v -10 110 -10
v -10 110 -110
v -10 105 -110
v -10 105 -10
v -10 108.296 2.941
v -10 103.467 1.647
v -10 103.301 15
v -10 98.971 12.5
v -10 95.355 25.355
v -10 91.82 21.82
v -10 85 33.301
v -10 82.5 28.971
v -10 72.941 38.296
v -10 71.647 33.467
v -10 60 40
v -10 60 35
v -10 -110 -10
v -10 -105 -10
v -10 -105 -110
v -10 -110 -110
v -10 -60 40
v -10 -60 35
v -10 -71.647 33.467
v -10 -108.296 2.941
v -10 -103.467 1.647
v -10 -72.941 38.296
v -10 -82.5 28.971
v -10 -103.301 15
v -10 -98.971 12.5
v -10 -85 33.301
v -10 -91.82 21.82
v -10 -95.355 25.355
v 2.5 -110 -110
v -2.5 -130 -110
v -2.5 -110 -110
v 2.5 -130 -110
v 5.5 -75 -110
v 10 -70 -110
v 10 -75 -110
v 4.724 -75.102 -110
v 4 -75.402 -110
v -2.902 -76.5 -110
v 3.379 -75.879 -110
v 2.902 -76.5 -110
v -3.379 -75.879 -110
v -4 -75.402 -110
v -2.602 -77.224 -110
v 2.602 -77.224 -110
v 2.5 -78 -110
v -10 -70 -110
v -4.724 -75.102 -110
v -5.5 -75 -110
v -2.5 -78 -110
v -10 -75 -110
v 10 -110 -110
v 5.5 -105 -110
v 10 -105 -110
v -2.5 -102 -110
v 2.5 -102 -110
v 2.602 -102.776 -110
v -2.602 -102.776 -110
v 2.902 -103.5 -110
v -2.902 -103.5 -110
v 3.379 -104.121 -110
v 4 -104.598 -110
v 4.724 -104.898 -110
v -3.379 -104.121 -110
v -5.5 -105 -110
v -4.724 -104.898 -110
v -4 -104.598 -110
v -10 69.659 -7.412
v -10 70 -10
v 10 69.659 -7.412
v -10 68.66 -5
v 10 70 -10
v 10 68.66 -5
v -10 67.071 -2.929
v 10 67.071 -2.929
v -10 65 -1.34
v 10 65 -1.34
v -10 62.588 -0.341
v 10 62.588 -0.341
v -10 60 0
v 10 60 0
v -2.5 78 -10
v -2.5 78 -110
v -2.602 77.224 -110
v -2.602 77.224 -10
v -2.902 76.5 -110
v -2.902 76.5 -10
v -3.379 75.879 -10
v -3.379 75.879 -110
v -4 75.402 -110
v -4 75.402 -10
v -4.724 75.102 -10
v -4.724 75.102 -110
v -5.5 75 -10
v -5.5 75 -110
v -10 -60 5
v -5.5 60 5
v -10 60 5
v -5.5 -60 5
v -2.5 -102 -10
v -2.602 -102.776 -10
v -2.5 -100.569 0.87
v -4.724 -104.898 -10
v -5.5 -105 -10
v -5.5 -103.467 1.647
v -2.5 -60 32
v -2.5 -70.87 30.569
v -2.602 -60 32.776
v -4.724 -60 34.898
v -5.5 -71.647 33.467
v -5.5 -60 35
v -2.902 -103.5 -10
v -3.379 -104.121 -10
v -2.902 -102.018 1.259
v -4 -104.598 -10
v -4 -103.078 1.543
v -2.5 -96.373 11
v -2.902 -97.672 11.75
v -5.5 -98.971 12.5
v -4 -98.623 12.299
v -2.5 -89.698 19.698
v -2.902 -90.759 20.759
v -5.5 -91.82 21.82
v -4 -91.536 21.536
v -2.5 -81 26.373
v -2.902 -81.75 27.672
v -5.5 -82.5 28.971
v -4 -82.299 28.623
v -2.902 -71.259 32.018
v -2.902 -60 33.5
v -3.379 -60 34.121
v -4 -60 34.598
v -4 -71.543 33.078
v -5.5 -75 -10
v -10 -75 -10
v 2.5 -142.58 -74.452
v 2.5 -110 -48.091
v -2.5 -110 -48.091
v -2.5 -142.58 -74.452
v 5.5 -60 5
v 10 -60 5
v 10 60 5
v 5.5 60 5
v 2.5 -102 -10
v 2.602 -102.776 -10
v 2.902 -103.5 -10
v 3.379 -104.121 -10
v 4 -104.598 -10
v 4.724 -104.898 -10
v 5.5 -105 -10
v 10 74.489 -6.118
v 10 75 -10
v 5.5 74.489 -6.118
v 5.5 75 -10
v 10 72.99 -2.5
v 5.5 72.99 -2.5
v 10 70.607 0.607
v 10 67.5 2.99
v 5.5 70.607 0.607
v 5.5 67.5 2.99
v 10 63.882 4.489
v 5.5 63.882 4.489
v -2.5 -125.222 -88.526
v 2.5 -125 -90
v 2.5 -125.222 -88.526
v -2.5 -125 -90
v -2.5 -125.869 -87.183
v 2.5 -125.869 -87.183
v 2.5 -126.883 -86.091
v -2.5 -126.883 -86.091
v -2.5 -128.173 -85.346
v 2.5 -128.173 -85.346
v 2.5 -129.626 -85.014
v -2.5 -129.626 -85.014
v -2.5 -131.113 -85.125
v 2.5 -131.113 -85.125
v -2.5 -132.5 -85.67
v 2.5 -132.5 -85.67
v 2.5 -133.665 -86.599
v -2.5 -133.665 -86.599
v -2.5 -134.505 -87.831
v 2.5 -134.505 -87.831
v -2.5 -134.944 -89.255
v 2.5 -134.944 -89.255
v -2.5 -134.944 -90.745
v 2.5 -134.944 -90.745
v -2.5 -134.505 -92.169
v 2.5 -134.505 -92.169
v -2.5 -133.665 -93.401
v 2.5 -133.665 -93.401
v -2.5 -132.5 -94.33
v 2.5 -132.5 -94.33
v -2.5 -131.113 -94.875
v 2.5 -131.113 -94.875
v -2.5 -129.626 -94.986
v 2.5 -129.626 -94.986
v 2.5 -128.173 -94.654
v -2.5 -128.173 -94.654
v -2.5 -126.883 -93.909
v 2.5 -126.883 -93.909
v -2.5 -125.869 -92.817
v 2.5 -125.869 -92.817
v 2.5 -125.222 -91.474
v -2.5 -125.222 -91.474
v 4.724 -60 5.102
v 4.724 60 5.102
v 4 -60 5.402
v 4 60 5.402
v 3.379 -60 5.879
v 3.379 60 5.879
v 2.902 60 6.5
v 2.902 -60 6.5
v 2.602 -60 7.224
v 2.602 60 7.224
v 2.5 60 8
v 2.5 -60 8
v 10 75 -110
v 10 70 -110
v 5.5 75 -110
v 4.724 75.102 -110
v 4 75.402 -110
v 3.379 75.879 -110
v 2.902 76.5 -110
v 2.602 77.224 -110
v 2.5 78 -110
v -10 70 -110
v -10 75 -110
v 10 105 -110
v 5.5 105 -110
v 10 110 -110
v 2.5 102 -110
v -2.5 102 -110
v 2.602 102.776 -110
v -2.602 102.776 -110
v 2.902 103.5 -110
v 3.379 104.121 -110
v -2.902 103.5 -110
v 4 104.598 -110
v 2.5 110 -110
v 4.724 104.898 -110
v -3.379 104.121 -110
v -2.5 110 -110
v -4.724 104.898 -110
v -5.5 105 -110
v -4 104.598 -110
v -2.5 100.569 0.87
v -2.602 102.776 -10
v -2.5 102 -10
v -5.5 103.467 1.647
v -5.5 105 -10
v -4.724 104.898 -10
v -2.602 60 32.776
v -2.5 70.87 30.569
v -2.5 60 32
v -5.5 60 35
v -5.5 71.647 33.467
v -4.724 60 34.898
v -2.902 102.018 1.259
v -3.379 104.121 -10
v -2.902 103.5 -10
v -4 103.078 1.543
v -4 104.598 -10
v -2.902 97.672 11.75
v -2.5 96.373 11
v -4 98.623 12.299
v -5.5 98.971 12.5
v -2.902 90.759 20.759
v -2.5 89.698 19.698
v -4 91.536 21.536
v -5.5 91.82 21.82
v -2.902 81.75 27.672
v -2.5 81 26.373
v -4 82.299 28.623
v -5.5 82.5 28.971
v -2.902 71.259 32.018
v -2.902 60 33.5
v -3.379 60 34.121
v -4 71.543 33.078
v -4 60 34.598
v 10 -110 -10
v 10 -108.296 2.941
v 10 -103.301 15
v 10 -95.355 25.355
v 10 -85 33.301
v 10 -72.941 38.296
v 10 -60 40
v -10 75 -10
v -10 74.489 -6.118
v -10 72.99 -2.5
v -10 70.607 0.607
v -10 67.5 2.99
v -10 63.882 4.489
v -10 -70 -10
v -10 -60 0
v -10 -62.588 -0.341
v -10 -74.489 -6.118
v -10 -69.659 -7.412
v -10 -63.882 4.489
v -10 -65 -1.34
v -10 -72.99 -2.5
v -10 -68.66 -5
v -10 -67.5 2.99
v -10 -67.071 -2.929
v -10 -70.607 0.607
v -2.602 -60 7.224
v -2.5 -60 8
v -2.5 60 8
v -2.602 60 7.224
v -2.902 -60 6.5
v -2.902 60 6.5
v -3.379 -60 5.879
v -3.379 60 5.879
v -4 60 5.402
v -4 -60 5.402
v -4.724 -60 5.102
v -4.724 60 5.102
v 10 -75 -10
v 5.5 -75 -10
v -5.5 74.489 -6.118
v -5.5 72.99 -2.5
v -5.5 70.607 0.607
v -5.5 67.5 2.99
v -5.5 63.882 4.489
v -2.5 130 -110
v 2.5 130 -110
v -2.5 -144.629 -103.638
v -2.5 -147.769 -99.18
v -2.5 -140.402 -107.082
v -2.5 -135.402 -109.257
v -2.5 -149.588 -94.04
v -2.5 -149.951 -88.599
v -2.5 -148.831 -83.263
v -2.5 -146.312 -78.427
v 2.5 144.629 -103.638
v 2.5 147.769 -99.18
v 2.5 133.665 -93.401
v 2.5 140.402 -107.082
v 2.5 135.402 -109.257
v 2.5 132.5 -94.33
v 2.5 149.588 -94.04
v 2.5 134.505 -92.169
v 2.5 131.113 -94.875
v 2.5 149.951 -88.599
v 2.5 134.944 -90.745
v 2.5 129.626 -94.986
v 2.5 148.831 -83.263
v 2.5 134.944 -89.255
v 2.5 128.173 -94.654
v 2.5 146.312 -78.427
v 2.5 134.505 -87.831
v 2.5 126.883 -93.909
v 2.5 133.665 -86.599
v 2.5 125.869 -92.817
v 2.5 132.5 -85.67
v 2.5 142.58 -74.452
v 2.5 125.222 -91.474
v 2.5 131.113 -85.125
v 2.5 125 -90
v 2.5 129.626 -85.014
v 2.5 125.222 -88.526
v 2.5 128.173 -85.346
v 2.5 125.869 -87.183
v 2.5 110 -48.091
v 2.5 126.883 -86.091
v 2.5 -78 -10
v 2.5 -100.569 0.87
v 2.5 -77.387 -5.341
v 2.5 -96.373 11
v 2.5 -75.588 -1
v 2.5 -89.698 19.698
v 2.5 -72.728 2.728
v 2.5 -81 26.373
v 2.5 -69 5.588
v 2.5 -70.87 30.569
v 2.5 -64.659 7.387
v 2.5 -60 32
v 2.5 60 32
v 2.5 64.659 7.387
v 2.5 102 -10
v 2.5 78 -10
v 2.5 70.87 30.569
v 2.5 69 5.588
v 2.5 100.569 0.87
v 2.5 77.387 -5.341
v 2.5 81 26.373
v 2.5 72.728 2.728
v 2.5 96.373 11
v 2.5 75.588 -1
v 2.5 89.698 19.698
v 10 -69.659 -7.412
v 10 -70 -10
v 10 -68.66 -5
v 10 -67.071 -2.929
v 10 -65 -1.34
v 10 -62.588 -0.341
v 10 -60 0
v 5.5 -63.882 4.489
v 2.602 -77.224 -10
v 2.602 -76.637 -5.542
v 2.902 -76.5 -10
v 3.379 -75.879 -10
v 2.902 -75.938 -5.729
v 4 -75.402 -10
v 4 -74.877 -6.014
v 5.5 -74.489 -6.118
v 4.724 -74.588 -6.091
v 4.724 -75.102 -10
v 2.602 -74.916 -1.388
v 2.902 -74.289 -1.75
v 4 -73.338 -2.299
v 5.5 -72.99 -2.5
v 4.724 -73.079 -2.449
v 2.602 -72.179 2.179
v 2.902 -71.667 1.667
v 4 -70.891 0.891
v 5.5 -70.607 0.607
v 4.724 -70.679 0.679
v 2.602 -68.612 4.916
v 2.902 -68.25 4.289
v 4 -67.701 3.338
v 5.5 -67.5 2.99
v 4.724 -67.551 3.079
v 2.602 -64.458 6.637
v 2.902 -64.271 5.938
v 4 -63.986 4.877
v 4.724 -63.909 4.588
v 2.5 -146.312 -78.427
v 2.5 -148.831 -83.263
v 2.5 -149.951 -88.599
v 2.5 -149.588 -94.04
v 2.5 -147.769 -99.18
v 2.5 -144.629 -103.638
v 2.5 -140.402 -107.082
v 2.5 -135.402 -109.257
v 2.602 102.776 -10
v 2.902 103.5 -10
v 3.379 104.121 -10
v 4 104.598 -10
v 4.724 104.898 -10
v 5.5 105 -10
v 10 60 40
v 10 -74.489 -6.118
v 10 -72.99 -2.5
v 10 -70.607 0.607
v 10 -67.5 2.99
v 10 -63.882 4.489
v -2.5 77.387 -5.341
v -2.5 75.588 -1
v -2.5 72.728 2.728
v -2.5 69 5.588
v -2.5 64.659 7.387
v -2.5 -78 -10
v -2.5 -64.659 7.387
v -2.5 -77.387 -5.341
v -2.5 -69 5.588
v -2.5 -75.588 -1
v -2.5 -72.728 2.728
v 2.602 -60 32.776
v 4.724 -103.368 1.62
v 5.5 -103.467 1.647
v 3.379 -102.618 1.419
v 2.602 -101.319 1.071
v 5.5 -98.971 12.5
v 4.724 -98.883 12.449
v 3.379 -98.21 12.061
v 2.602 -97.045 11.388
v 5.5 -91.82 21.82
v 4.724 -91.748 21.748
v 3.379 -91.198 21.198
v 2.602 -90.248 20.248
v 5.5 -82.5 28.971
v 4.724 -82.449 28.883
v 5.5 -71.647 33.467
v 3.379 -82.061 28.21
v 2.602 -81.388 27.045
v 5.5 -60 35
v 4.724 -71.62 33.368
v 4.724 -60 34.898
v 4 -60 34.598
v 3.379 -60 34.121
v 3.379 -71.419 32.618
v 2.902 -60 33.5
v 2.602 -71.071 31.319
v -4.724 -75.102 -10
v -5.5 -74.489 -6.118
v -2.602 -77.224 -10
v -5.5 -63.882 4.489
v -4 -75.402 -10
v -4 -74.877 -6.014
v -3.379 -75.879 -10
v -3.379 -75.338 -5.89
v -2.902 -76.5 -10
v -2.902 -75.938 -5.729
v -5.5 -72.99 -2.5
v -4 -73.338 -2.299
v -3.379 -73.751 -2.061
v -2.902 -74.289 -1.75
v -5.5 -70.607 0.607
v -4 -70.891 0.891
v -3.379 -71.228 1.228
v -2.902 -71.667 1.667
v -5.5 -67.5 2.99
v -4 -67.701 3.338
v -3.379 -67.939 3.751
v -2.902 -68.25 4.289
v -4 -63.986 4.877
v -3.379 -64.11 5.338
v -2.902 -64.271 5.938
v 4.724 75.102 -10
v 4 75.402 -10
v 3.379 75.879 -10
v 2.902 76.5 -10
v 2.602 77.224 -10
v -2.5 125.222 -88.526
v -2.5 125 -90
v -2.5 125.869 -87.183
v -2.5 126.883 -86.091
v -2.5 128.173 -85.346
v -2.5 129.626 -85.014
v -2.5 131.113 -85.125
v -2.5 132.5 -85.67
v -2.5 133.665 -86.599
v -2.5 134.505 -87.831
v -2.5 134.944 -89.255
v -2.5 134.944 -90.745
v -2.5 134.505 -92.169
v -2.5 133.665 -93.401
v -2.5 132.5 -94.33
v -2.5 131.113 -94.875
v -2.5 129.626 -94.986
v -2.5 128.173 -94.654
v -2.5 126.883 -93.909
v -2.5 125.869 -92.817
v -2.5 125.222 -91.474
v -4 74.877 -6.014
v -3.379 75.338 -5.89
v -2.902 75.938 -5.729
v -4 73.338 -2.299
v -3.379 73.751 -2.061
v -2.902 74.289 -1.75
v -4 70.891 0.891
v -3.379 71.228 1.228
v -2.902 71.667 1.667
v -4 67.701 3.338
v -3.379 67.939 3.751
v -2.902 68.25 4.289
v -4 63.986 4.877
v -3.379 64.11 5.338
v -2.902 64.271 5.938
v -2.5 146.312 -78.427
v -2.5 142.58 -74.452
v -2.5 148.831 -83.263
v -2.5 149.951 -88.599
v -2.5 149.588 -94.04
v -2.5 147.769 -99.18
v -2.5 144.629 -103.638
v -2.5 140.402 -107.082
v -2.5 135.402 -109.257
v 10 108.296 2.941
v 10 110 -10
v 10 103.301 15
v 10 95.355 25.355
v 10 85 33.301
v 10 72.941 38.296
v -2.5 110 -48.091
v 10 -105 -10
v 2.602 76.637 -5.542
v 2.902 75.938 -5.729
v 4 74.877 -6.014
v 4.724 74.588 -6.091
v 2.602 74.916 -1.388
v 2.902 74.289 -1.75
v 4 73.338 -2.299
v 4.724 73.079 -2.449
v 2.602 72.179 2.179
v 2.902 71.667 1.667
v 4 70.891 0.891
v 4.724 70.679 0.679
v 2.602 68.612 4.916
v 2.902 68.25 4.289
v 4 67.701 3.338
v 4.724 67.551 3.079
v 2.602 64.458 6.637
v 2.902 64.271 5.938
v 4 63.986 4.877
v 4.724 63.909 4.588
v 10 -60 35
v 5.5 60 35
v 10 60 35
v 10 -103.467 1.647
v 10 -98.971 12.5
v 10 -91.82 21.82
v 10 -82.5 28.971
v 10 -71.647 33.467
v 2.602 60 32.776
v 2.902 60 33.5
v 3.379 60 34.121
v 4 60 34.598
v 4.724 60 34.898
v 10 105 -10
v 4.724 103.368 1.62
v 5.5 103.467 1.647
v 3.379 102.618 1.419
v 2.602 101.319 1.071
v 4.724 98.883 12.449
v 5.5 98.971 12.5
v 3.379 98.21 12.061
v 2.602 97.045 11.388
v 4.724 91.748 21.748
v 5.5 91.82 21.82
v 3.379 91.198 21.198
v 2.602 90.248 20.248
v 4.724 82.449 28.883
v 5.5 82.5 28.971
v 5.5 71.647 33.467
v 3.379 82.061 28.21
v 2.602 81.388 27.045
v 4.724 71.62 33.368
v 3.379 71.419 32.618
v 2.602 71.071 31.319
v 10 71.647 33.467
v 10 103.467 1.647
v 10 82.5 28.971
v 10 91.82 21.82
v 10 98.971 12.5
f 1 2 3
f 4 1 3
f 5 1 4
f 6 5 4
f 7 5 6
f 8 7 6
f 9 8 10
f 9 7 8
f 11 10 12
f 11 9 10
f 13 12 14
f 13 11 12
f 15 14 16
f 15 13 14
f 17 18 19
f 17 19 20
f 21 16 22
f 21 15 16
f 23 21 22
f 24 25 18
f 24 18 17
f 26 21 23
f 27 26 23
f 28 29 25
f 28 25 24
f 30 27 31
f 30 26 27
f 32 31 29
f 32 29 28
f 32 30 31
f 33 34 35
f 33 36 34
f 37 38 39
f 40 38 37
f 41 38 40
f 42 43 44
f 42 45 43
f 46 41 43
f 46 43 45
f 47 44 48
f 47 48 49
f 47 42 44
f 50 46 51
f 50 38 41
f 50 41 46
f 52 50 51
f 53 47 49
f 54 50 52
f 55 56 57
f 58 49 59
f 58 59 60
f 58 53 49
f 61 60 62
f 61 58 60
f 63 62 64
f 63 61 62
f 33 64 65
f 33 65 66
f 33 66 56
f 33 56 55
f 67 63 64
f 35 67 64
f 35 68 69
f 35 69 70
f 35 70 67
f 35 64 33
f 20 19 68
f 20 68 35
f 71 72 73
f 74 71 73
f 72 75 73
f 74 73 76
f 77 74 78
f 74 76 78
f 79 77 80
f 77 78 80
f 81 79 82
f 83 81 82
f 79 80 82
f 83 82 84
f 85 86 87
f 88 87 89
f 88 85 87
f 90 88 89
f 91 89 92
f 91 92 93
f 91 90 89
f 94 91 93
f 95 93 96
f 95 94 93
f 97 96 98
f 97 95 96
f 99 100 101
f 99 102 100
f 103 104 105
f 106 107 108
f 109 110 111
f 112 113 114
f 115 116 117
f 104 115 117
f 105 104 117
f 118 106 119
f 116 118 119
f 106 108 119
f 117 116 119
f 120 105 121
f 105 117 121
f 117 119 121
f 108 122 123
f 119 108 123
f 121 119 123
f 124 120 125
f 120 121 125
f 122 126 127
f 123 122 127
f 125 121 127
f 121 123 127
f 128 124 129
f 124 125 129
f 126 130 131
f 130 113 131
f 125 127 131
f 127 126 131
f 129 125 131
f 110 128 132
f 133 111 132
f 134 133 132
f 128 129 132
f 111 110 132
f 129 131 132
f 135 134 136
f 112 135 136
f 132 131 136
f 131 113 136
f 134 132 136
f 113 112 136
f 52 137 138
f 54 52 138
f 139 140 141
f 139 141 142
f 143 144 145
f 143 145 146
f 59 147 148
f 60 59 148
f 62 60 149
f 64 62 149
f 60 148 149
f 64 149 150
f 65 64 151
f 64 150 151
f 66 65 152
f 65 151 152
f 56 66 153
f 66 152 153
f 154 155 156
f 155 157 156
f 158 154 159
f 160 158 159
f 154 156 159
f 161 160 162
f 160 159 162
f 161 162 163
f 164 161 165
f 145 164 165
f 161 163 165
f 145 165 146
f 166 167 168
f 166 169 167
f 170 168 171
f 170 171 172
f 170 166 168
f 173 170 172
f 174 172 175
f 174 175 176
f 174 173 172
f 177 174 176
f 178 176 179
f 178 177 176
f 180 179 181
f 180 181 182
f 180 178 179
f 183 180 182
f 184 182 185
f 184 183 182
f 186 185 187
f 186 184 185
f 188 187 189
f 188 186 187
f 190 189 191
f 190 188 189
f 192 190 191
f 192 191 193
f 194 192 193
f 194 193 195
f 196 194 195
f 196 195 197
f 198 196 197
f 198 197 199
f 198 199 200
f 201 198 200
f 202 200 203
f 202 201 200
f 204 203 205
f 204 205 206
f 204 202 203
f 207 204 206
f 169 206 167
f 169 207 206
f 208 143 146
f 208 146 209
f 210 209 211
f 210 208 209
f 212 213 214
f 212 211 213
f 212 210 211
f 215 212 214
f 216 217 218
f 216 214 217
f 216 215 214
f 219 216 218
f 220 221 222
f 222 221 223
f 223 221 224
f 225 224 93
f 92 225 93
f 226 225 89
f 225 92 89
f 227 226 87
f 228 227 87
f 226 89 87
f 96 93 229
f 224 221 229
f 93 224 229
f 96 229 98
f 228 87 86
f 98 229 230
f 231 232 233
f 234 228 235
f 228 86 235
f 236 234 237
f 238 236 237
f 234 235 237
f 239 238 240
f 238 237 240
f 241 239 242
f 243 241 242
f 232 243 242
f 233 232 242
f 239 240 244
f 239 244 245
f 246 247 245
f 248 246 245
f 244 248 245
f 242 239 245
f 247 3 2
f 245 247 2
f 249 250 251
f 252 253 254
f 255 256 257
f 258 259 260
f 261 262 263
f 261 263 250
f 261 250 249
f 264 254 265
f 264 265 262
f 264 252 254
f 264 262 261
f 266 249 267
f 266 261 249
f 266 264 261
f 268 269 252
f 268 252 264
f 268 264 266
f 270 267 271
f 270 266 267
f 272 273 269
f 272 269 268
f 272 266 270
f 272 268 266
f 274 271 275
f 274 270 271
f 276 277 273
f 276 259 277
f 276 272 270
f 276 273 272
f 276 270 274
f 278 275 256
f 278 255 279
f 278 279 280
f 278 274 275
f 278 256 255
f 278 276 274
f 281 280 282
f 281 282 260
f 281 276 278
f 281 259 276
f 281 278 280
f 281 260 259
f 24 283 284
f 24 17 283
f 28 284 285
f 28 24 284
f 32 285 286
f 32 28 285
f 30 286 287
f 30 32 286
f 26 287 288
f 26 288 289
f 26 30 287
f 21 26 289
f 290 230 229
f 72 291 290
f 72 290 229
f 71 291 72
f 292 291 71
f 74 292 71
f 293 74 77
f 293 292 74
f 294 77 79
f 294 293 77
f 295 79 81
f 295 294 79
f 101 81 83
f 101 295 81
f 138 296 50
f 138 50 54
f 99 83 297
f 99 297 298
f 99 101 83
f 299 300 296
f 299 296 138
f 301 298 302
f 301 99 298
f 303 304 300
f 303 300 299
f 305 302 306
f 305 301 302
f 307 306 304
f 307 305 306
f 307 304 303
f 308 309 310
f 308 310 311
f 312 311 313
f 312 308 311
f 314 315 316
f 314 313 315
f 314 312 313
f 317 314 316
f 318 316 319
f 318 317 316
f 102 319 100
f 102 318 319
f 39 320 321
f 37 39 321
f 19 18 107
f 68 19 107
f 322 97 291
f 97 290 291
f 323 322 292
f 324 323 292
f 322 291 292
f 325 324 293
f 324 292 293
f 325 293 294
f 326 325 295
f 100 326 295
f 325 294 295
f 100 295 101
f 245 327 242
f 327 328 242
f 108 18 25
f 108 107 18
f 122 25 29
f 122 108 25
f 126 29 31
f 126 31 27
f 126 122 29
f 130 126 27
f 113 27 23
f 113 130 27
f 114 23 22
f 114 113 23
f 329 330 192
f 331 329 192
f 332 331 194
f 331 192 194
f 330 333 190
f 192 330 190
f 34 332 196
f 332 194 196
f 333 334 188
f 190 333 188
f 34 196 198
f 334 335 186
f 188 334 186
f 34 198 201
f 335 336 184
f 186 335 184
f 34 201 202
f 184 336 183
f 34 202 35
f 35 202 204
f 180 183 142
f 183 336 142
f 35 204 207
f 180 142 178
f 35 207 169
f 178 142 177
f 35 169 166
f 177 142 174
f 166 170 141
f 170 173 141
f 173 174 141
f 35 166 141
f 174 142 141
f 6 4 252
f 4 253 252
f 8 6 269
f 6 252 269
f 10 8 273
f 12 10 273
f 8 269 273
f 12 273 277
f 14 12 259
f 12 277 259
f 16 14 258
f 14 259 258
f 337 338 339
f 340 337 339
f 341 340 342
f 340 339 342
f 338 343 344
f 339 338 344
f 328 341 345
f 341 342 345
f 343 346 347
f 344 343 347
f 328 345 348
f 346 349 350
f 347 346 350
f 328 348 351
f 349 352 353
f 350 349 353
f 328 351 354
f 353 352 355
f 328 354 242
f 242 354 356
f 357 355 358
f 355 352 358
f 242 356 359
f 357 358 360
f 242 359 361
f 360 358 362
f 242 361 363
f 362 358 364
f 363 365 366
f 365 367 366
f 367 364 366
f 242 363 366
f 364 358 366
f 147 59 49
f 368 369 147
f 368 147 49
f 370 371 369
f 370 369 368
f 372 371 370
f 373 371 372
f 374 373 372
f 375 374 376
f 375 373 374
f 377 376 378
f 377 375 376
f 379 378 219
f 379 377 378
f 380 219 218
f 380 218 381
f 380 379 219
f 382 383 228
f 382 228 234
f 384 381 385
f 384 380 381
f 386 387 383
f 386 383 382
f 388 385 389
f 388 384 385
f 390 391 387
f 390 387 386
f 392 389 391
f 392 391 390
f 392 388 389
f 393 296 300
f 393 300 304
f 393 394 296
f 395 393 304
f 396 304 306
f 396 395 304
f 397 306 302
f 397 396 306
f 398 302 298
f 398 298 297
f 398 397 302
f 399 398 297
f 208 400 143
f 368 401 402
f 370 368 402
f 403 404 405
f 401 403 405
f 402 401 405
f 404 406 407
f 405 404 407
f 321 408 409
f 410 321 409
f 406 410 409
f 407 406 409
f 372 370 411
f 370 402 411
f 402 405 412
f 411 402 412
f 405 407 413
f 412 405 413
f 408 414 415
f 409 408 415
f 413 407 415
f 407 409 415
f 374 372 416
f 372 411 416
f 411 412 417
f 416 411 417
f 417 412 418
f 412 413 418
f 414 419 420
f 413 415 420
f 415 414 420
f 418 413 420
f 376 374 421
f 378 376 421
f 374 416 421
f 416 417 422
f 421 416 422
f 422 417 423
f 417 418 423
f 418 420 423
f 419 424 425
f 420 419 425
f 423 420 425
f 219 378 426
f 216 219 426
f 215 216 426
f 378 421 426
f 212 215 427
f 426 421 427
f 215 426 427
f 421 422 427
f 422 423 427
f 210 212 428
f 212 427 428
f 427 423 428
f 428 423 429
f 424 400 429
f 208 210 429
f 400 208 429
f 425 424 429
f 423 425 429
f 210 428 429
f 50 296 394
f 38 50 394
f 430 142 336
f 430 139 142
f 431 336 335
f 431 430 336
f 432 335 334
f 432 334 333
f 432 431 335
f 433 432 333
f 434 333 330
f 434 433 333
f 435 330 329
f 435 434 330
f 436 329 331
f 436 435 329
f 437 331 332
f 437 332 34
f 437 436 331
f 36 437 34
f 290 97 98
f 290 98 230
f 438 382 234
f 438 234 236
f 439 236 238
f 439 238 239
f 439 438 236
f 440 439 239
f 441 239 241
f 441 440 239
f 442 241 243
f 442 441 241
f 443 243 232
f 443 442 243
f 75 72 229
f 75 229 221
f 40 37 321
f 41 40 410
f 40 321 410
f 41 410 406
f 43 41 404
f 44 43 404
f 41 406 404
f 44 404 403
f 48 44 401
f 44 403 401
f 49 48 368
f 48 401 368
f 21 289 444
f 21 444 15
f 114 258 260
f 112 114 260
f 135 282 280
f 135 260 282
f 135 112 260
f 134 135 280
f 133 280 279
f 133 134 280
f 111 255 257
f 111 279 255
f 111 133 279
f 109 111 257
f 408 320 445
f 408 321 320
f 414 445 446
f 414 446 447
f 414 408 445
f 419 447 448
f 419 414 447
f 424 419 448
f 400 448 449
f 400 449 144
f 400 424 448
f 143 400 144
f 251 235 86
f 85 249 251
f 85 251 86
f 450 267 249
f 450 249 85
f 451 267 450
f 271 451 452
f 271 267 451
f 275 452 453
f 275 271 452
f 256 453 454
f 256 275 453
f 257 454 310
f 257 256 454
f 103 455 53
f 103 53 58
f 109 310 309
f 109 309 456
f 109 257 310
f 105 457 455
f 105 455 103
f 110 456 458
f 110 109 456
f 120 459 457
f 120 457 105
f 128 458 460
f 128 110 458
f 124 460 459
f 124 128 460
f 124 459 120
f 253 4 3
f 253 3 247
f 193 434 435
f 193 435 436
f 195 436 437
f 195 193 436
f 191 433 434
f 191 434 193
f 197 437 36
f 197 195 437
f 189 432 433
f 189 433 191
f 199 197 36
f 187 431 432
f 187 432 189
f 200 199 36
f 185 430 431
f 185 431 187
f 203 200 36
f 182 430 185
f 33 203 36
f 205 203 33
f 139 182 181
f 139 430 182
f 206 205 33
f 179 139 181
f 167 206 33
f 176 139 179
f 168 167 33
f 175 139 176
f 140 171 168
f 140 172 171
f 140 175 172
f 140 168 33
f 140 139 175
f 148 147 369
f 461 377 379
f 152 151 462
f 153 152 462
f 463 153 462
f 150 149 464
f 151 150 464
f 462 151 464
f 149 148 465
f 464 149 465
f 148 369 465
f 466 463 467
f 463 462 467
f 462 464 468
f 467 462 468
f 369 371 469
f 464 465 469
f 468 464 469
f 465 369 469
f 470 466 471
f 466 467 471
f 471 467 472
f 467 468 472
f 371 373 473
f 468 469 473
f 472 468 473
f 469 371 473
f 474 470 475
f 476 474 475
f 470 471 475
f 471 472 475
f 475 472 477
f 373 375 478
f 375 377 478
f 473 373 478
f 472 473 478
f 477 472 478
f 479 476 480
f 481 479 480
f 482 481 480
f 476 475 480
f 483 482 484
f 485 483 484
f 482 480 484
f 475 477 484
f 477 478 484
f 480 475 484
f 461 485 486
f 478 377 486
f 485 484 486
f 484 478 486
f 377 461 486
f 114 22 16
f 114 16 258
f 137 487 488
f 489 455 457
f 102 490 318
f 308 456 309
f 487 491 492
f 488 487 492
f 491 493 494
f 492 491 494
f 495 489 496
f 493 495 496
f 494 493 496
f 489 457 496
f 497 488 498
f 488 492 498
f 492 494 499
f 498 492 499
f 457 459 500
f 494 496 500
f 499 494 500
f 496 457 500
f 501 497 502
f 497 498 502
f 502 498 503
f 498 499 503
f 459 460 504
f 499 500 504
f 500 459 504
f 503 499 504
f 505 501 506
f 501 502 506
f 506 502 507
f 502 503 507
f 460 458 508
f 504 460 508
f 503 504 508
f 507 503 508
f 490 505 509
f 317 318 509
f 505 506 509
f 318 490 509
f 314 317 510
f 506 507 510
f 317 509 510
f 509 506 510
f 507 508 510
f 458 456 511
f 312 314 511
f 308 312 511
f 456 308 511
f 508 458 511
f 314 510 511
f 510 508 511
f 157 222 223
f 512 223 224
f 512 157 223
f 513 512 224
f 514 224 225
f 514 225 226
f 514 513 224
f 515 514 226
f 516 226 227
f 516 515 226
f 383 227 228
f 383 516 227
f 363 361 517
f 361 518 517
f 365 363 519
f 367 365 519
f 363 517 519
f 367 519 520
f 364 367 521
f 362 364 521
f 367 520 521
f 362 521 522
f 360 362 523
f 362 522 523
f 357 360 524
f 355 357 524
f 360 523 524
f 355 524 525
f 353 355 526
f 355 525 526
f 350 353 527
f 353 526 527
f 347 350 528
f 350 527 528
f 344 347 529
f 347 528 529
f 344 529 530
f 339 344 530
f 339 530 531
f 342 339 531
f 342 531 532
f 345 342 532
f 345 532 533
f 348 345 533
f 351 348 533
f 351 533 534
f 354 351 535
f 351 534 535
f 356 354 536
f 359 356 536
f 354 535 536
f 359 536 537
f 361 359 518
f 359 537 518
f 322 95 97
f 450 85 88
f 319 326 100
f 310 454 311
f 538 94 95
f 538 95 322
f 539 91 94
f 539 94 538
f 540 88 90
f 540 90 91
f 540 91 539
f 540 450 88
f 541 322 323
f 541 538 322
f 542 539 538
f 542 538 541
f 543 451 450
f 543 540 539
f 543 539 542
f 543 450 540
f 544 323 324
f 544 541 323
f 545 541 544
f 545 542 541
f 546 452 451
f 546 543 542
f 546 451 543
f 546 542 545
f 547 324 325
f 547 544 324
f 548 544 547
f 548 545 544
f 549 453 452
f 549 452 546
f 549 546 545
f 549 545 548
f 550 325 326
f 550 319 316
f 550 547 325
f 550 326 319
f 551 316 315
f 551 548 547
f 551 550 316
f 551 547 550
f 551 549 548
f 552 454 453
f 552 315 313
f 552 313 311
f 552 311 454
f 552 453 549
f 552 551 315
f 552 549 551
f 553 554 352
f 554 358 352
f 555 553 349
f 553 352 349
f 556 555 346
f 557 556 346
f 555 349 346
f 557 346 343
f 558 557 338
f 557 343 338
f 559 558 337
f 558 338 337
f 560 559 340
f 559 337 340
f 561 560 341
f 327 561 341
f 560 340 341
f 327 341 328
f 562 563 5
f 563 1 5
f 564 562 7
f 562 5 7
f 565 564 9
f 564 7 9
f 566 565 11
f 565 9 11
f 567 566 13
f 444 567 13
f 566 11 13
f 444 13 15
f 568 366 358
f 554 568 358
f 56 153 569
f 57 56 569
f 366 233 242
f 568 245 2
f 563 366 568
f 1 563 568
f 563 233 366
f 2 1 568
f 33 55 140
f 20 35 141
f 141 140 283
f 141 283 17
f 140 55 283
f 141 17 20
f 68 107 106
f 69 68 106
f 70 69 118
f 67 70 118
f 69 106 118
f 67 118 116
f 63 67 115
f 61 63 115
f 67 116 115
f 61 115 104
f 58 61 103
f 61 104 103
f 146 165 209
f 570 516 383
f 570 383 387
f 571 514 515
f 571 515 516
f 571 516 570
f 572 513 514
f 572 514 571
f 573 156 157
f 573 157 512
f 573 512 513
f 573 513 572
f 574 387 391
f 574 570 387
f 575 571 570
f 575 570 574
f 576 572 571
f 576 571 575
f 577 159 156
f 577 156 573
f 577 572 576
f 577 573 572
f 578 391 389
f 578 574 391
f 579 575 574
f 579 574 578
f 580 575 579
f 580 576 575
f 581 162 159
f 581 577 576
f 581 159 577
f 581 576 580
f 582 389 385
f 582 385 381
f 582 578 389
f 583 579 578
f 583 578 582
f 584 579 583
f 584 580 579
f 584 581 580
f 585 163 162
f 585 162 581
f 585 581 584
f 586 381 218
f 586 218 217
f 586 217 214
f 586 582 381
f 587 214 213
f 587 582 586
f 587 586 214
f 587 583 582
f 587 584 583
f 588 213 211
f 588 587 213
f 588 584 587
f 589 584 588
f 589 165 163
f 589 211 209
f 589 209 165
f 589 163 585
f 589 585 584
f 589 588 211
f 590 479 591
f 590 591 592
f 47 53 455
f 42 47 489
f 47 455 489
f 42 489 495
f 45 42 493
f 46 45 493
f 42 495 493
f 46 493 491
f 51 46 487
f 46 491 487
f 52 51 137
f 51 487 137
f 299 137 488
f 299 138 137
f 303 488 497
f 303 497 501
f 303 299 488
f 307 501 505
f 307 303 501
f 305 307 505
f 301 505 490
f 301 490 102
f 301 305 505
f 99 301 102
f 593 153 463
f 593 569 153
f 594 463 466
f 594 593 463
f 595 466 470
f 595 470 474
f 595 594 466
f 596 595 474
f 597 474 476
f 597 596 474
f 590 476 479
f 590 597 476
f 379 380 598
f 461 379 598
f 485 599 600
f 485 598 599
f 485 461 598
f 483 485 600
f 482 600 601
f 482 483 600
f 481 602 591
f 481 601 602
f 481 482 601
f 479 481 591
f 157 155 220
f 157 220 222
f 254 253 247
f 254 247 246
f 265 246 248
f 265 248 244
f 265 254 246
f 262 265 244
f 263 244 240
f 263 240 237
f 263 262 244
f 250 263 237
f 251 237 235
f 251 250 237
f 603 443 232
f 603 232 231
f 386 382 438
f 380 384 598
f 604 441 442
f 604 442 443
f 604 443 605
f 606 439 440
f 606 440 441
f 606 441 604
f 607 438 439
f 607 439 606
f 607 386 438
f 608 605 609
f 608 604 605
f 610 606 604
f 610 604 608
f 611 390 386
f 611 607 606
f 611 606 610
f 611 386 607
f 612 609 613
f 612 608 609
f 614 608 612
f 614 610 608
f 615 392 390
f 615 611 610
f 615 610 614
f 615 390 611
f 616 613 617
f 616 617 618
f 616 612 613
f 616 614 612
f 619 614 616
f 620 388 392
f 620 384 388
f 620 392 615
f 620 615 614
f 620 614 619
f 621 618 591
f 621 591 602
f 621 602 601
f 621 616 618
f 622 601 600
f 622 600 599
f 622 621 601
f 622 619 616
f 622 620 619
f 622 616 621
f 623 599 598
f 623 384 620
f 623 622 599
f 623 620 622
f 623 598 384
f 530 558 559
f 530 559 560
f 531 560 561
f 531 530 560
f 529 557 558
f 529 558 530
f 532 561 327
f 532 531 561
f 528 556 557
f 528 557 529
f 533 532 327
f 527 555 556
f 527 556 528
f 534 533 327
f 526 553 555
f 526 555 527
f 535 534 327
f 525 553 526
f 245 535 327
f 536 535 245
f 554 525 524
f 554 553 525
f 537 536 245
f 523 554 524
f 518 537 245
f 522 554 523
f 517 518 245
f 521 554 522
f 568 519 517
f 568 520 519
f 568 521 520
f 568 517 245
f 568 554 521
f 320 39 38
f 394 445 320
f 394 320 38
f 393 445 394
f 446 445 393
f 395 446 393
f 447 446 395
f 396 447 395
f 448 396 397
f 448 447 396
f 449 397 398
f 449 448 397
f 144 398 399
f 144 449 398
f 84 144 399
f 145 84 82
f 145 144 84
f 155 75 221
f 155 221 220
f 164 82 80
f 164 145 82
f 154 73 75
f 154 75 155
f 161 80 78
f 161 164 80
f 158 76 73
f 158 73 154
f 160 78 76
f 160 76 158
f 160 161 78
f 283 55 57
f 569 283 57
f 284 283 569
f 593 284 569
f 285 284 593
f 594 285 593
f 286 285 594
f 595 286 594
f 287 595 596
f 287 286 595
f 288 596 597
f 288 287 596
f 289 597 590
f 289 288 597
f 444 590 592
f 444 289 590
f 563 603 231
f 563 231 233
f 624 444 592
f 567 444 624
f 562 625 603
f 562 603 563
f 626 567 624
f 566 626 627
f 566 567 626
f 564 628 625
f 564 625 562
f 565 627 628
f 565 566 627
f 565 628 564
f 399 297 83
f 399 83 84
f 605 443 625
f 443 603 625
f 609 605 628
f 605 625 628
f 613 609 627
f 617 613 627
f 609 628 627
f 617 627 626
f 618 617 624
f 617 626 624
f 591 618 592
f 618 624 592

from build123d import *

# Parameters (mm, degrees)
F2_R     = 5
F5_DEPTH = 2.5


with BuildPart() as f3:
    # F3: sweep along a path in F1
    with BuildLine(Plane.YZ) as f3_path:
        Line((-70, -110), (-70, -10))
        ThreePointArc((-70, -10), (-67.0710678119, -2.9289321881), (-60, 0))
        Line((-60, 0), (0, 0))
    # F0 (on Front) → F3 (sweep)
    with BuildSketch(Plane.XZ):
        with BuildLine():
            Line((-10, 0), (10, 0))
            Line((10, 0), (10, 5))
            Line((10, 5), (5.5, 5))
            ThreePointArc((5.5, 5), (3.3786796564, 5.8786796564), (2.5, 8))
            Line((2.5, 8), (2.5, 32))
            ThreePointArc((2.5, 32), (3.3786796564, 34.1213203436), (5.5, 35))
            Line((5.5, 35), (10, 35))
            Line((10, 35), (10, 40))
            Line((10, 40), (-10, 40))
            Line((-10, 40), (-10, 35))
            Line((-10, 35), (-5.5, 35))
            ThreePointArc((-5.5, 35), (-3.3786796564, 34.1213203436), (-2.5, 32))
            Line((-2.5, 32), (-2.5, 8))
            ThreePointArc((-2.5, 8), (-3.3786796564, 5.8786796564), (-5.5, 5))
            Line((-5.5, 5), (-10, 5))
            Line((-10, 5), (-10, 0))
        make_face()
    sweep(path=f3_path.line)

    # F4: F3 across plane


with BuildPart() as f3_1:
    add(f3.part)
    add(f3.part.mirror(Plane.XZ))

    # F2 (on Right) → F5 (join, symmetric)
    with BuildSketch(Plane.YZ):
        with BuildLine():
            Line((-130, -110), (-100, -110))
            Line((-100, -110), (-100, -40))
            Line((-100, -40), (-142.5800752207, -74.4519548676))
            ThreePointArc((-142.5800752207, -74.4519548676), (-148.8541892248, -96.6722971064), (-130, -110))
        make_face()
        with Locations((-130, -90)):
            Circle(F2_R, mode=Mode.SUBTRACT)
    extrude(amount=F5_DEPTH, both=True)

    # F6: F3 across plane


with BuildPart() as f3_2:
    add(f3_1.part)
    add(f3_1.part.mirror(Plane.XZ))


solid = f3_2.part
